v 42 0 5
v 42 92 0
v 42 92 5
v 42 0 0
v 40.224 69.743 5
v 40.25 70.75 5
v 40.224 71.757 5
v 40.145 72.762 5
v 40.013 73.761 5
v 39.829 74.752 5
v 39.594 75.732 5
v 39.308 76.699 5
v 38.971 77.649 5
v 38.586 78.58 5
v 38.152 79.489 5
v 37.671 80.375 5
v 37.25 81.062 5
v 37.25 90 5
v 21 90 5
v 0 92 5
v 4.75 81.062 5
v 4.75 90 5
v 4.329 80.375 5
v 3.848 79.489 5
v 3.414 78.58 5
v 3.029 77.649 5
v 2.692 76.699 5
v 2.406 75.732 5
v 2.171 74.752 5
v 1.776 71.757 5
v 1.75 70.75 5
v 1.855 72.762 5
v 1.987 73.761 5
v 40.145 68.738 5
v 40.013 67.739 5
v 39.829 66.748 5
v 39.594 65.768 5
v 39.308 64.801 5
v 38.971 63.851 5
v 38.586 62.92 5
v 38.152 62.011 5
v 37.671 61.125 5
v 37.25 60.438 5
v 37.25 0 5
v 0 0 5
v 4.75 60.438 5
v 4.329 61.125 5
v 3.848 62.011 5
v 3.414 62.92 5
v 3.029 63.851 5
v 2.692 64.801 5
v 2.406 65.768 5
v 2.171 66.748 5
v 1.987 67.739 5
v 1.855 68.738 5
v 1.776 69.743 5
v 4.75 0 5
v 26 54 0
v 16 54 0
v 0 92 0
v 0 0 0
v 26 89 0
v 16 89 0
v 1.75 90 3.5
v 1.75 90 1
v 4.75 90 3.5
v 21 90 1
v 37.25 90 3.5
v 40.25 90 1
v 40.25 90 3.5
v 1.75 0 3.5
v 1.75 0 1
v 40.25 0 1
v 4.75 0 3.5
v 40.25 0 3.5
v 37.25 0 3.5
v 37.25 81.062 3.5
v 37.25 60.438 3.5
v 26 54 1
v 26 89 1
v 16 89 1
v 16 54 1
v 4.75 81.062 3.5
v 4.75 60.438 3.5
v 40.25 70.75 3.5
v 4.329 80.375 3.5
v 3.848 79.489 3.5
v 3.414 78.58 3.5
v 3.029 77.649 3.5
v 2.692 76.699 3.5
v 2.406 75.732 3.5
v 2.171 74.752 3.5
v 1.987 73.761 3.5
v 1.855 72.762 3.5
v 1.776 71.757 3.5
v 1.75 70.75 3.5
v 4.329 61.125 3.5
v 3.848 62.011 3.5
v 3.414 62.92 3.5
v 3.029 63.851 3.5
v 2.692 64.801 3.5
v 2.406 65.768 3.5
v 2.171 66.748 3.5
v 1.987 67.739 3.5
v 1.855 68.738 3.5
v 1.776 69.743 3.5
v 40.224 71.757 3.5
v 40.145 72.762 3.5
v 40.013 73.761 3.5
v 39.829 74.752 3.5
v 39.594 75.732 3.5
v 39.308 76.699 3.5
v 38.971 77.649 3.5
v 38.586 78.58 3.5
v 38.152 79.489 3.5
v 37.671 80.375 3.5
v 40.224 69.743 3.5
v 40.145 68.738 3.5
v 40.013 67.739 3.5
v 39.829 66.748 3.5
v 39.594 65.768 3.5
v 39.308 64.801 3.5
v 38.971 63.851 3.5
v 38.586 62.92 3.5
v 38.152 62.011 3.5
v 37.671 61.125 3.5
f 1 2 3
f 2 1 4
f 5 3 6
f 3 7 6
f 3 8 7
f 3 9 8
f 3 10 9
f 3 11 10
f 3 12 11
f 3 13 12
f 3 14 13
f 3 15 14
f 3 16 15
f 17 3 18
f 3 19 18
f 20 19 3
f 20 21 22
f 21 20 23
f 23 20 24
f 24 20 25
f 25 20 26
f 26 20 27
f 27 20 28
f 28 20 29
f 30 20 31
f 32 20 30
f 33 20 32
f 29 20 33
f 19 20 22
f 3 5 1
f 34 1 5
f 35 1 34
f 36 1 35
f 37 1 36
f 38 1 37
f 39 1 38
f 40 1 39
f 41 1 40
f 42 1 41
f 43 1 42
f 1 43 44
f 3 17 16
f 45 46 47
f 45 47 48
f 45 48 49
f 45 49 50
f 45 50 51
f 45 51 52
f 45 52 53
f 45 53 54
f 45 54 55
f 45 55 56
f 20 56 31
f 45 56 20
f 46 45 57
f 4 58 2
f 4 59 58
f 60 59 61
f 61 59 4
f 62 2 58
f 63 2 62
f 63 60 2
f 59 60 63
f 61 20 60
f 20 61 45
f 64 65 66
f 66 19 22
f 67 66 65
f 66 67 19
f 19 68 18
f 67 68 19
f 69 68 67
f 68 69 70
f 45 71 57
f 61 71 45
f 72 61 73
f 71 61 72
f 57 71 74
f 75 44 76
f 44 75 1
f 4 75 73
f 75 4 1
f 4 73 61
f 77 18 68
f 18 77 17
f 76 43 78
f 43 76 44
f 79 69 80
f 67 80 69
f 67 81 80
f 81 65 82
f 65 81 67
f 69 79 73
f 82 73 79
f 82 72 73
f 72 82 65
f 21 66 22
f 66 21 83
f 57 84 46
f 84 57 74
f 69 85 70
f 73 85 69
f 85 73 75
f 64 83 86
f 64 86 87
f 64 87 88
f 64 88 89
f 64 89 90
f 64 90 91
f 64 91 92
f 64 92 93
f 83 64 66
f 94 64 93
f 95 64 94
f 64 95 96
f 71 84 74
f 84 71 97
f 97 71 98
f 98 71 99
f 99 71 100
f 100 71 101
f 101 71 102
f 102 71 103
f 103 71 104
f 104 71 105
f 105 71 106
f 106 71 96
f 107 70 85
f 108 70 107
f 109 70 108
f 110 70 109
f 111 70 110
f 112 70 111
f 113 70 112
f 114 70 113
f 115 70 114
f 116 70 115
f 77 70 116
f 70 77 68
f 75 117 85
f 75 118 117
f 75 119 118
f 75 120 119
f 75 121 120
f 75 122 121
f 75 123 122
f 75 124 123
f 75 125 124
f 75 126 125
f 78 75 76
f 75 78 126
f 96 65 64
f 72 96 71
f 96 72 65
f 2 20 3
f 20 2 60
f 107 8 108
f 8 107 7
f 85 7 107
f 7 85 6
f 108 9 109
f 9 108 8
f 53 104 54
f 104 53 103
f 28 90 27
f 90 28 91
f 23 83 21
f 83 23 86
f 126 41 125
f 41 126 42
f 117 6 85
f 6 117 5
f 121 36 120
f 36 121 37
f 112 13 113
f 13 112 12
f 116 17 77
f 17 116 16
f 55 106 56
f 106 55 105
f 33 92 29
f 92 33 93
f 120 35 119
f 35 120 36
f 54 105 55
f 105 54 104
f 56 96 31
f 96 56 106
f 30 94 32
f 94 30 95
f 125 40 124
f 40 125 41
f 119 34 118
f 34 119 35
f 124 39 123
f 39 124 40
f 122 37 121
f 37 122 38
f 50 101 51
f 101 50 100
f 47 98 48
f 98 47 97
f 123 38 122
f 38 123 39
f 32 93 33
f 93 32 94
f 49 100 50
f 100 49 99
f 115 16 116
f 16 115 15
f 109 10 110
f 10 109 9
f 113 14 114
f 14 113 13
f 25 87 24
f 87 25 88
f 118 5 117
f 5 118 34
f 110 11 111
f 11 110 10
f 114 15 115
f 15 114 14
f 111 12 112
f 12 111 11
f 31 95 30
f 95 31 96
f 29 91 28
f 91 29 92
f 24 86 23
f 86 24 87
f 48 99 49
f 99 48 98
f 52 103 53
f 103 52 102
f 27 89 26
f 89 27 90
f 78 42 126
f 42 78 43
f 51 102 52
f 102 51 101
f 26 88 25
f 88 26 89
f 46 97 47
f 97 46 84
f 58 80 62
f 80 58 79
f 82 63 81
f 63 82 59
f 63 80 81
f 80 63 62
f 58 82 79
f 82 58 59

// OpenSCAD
$fn = 120;

difference() {
	union() {
		difference() {
			cube(size = [42, 90, 5]);
			translate(v = [4.75, -1, 1.0]) {
				cube(size = [32.5, 92, 5]);
			}
			translate(v = [1.75, -1, 1.0]) {
				cube(size = [38.5, 92, 2.5]);
			}
		}
		translate(v = [0, 90, 0]) {
			cube(size = [42, 2, 5]);
		}
	}
	translate(v = [21.0, 70.75, 1.0]) {
		cylinder(d = 38.5, h = 5.5);
	}
	translate(v = [16.0, 54, -1]) {
		cube(size = [10, 35.0, 10]);
	}
}
